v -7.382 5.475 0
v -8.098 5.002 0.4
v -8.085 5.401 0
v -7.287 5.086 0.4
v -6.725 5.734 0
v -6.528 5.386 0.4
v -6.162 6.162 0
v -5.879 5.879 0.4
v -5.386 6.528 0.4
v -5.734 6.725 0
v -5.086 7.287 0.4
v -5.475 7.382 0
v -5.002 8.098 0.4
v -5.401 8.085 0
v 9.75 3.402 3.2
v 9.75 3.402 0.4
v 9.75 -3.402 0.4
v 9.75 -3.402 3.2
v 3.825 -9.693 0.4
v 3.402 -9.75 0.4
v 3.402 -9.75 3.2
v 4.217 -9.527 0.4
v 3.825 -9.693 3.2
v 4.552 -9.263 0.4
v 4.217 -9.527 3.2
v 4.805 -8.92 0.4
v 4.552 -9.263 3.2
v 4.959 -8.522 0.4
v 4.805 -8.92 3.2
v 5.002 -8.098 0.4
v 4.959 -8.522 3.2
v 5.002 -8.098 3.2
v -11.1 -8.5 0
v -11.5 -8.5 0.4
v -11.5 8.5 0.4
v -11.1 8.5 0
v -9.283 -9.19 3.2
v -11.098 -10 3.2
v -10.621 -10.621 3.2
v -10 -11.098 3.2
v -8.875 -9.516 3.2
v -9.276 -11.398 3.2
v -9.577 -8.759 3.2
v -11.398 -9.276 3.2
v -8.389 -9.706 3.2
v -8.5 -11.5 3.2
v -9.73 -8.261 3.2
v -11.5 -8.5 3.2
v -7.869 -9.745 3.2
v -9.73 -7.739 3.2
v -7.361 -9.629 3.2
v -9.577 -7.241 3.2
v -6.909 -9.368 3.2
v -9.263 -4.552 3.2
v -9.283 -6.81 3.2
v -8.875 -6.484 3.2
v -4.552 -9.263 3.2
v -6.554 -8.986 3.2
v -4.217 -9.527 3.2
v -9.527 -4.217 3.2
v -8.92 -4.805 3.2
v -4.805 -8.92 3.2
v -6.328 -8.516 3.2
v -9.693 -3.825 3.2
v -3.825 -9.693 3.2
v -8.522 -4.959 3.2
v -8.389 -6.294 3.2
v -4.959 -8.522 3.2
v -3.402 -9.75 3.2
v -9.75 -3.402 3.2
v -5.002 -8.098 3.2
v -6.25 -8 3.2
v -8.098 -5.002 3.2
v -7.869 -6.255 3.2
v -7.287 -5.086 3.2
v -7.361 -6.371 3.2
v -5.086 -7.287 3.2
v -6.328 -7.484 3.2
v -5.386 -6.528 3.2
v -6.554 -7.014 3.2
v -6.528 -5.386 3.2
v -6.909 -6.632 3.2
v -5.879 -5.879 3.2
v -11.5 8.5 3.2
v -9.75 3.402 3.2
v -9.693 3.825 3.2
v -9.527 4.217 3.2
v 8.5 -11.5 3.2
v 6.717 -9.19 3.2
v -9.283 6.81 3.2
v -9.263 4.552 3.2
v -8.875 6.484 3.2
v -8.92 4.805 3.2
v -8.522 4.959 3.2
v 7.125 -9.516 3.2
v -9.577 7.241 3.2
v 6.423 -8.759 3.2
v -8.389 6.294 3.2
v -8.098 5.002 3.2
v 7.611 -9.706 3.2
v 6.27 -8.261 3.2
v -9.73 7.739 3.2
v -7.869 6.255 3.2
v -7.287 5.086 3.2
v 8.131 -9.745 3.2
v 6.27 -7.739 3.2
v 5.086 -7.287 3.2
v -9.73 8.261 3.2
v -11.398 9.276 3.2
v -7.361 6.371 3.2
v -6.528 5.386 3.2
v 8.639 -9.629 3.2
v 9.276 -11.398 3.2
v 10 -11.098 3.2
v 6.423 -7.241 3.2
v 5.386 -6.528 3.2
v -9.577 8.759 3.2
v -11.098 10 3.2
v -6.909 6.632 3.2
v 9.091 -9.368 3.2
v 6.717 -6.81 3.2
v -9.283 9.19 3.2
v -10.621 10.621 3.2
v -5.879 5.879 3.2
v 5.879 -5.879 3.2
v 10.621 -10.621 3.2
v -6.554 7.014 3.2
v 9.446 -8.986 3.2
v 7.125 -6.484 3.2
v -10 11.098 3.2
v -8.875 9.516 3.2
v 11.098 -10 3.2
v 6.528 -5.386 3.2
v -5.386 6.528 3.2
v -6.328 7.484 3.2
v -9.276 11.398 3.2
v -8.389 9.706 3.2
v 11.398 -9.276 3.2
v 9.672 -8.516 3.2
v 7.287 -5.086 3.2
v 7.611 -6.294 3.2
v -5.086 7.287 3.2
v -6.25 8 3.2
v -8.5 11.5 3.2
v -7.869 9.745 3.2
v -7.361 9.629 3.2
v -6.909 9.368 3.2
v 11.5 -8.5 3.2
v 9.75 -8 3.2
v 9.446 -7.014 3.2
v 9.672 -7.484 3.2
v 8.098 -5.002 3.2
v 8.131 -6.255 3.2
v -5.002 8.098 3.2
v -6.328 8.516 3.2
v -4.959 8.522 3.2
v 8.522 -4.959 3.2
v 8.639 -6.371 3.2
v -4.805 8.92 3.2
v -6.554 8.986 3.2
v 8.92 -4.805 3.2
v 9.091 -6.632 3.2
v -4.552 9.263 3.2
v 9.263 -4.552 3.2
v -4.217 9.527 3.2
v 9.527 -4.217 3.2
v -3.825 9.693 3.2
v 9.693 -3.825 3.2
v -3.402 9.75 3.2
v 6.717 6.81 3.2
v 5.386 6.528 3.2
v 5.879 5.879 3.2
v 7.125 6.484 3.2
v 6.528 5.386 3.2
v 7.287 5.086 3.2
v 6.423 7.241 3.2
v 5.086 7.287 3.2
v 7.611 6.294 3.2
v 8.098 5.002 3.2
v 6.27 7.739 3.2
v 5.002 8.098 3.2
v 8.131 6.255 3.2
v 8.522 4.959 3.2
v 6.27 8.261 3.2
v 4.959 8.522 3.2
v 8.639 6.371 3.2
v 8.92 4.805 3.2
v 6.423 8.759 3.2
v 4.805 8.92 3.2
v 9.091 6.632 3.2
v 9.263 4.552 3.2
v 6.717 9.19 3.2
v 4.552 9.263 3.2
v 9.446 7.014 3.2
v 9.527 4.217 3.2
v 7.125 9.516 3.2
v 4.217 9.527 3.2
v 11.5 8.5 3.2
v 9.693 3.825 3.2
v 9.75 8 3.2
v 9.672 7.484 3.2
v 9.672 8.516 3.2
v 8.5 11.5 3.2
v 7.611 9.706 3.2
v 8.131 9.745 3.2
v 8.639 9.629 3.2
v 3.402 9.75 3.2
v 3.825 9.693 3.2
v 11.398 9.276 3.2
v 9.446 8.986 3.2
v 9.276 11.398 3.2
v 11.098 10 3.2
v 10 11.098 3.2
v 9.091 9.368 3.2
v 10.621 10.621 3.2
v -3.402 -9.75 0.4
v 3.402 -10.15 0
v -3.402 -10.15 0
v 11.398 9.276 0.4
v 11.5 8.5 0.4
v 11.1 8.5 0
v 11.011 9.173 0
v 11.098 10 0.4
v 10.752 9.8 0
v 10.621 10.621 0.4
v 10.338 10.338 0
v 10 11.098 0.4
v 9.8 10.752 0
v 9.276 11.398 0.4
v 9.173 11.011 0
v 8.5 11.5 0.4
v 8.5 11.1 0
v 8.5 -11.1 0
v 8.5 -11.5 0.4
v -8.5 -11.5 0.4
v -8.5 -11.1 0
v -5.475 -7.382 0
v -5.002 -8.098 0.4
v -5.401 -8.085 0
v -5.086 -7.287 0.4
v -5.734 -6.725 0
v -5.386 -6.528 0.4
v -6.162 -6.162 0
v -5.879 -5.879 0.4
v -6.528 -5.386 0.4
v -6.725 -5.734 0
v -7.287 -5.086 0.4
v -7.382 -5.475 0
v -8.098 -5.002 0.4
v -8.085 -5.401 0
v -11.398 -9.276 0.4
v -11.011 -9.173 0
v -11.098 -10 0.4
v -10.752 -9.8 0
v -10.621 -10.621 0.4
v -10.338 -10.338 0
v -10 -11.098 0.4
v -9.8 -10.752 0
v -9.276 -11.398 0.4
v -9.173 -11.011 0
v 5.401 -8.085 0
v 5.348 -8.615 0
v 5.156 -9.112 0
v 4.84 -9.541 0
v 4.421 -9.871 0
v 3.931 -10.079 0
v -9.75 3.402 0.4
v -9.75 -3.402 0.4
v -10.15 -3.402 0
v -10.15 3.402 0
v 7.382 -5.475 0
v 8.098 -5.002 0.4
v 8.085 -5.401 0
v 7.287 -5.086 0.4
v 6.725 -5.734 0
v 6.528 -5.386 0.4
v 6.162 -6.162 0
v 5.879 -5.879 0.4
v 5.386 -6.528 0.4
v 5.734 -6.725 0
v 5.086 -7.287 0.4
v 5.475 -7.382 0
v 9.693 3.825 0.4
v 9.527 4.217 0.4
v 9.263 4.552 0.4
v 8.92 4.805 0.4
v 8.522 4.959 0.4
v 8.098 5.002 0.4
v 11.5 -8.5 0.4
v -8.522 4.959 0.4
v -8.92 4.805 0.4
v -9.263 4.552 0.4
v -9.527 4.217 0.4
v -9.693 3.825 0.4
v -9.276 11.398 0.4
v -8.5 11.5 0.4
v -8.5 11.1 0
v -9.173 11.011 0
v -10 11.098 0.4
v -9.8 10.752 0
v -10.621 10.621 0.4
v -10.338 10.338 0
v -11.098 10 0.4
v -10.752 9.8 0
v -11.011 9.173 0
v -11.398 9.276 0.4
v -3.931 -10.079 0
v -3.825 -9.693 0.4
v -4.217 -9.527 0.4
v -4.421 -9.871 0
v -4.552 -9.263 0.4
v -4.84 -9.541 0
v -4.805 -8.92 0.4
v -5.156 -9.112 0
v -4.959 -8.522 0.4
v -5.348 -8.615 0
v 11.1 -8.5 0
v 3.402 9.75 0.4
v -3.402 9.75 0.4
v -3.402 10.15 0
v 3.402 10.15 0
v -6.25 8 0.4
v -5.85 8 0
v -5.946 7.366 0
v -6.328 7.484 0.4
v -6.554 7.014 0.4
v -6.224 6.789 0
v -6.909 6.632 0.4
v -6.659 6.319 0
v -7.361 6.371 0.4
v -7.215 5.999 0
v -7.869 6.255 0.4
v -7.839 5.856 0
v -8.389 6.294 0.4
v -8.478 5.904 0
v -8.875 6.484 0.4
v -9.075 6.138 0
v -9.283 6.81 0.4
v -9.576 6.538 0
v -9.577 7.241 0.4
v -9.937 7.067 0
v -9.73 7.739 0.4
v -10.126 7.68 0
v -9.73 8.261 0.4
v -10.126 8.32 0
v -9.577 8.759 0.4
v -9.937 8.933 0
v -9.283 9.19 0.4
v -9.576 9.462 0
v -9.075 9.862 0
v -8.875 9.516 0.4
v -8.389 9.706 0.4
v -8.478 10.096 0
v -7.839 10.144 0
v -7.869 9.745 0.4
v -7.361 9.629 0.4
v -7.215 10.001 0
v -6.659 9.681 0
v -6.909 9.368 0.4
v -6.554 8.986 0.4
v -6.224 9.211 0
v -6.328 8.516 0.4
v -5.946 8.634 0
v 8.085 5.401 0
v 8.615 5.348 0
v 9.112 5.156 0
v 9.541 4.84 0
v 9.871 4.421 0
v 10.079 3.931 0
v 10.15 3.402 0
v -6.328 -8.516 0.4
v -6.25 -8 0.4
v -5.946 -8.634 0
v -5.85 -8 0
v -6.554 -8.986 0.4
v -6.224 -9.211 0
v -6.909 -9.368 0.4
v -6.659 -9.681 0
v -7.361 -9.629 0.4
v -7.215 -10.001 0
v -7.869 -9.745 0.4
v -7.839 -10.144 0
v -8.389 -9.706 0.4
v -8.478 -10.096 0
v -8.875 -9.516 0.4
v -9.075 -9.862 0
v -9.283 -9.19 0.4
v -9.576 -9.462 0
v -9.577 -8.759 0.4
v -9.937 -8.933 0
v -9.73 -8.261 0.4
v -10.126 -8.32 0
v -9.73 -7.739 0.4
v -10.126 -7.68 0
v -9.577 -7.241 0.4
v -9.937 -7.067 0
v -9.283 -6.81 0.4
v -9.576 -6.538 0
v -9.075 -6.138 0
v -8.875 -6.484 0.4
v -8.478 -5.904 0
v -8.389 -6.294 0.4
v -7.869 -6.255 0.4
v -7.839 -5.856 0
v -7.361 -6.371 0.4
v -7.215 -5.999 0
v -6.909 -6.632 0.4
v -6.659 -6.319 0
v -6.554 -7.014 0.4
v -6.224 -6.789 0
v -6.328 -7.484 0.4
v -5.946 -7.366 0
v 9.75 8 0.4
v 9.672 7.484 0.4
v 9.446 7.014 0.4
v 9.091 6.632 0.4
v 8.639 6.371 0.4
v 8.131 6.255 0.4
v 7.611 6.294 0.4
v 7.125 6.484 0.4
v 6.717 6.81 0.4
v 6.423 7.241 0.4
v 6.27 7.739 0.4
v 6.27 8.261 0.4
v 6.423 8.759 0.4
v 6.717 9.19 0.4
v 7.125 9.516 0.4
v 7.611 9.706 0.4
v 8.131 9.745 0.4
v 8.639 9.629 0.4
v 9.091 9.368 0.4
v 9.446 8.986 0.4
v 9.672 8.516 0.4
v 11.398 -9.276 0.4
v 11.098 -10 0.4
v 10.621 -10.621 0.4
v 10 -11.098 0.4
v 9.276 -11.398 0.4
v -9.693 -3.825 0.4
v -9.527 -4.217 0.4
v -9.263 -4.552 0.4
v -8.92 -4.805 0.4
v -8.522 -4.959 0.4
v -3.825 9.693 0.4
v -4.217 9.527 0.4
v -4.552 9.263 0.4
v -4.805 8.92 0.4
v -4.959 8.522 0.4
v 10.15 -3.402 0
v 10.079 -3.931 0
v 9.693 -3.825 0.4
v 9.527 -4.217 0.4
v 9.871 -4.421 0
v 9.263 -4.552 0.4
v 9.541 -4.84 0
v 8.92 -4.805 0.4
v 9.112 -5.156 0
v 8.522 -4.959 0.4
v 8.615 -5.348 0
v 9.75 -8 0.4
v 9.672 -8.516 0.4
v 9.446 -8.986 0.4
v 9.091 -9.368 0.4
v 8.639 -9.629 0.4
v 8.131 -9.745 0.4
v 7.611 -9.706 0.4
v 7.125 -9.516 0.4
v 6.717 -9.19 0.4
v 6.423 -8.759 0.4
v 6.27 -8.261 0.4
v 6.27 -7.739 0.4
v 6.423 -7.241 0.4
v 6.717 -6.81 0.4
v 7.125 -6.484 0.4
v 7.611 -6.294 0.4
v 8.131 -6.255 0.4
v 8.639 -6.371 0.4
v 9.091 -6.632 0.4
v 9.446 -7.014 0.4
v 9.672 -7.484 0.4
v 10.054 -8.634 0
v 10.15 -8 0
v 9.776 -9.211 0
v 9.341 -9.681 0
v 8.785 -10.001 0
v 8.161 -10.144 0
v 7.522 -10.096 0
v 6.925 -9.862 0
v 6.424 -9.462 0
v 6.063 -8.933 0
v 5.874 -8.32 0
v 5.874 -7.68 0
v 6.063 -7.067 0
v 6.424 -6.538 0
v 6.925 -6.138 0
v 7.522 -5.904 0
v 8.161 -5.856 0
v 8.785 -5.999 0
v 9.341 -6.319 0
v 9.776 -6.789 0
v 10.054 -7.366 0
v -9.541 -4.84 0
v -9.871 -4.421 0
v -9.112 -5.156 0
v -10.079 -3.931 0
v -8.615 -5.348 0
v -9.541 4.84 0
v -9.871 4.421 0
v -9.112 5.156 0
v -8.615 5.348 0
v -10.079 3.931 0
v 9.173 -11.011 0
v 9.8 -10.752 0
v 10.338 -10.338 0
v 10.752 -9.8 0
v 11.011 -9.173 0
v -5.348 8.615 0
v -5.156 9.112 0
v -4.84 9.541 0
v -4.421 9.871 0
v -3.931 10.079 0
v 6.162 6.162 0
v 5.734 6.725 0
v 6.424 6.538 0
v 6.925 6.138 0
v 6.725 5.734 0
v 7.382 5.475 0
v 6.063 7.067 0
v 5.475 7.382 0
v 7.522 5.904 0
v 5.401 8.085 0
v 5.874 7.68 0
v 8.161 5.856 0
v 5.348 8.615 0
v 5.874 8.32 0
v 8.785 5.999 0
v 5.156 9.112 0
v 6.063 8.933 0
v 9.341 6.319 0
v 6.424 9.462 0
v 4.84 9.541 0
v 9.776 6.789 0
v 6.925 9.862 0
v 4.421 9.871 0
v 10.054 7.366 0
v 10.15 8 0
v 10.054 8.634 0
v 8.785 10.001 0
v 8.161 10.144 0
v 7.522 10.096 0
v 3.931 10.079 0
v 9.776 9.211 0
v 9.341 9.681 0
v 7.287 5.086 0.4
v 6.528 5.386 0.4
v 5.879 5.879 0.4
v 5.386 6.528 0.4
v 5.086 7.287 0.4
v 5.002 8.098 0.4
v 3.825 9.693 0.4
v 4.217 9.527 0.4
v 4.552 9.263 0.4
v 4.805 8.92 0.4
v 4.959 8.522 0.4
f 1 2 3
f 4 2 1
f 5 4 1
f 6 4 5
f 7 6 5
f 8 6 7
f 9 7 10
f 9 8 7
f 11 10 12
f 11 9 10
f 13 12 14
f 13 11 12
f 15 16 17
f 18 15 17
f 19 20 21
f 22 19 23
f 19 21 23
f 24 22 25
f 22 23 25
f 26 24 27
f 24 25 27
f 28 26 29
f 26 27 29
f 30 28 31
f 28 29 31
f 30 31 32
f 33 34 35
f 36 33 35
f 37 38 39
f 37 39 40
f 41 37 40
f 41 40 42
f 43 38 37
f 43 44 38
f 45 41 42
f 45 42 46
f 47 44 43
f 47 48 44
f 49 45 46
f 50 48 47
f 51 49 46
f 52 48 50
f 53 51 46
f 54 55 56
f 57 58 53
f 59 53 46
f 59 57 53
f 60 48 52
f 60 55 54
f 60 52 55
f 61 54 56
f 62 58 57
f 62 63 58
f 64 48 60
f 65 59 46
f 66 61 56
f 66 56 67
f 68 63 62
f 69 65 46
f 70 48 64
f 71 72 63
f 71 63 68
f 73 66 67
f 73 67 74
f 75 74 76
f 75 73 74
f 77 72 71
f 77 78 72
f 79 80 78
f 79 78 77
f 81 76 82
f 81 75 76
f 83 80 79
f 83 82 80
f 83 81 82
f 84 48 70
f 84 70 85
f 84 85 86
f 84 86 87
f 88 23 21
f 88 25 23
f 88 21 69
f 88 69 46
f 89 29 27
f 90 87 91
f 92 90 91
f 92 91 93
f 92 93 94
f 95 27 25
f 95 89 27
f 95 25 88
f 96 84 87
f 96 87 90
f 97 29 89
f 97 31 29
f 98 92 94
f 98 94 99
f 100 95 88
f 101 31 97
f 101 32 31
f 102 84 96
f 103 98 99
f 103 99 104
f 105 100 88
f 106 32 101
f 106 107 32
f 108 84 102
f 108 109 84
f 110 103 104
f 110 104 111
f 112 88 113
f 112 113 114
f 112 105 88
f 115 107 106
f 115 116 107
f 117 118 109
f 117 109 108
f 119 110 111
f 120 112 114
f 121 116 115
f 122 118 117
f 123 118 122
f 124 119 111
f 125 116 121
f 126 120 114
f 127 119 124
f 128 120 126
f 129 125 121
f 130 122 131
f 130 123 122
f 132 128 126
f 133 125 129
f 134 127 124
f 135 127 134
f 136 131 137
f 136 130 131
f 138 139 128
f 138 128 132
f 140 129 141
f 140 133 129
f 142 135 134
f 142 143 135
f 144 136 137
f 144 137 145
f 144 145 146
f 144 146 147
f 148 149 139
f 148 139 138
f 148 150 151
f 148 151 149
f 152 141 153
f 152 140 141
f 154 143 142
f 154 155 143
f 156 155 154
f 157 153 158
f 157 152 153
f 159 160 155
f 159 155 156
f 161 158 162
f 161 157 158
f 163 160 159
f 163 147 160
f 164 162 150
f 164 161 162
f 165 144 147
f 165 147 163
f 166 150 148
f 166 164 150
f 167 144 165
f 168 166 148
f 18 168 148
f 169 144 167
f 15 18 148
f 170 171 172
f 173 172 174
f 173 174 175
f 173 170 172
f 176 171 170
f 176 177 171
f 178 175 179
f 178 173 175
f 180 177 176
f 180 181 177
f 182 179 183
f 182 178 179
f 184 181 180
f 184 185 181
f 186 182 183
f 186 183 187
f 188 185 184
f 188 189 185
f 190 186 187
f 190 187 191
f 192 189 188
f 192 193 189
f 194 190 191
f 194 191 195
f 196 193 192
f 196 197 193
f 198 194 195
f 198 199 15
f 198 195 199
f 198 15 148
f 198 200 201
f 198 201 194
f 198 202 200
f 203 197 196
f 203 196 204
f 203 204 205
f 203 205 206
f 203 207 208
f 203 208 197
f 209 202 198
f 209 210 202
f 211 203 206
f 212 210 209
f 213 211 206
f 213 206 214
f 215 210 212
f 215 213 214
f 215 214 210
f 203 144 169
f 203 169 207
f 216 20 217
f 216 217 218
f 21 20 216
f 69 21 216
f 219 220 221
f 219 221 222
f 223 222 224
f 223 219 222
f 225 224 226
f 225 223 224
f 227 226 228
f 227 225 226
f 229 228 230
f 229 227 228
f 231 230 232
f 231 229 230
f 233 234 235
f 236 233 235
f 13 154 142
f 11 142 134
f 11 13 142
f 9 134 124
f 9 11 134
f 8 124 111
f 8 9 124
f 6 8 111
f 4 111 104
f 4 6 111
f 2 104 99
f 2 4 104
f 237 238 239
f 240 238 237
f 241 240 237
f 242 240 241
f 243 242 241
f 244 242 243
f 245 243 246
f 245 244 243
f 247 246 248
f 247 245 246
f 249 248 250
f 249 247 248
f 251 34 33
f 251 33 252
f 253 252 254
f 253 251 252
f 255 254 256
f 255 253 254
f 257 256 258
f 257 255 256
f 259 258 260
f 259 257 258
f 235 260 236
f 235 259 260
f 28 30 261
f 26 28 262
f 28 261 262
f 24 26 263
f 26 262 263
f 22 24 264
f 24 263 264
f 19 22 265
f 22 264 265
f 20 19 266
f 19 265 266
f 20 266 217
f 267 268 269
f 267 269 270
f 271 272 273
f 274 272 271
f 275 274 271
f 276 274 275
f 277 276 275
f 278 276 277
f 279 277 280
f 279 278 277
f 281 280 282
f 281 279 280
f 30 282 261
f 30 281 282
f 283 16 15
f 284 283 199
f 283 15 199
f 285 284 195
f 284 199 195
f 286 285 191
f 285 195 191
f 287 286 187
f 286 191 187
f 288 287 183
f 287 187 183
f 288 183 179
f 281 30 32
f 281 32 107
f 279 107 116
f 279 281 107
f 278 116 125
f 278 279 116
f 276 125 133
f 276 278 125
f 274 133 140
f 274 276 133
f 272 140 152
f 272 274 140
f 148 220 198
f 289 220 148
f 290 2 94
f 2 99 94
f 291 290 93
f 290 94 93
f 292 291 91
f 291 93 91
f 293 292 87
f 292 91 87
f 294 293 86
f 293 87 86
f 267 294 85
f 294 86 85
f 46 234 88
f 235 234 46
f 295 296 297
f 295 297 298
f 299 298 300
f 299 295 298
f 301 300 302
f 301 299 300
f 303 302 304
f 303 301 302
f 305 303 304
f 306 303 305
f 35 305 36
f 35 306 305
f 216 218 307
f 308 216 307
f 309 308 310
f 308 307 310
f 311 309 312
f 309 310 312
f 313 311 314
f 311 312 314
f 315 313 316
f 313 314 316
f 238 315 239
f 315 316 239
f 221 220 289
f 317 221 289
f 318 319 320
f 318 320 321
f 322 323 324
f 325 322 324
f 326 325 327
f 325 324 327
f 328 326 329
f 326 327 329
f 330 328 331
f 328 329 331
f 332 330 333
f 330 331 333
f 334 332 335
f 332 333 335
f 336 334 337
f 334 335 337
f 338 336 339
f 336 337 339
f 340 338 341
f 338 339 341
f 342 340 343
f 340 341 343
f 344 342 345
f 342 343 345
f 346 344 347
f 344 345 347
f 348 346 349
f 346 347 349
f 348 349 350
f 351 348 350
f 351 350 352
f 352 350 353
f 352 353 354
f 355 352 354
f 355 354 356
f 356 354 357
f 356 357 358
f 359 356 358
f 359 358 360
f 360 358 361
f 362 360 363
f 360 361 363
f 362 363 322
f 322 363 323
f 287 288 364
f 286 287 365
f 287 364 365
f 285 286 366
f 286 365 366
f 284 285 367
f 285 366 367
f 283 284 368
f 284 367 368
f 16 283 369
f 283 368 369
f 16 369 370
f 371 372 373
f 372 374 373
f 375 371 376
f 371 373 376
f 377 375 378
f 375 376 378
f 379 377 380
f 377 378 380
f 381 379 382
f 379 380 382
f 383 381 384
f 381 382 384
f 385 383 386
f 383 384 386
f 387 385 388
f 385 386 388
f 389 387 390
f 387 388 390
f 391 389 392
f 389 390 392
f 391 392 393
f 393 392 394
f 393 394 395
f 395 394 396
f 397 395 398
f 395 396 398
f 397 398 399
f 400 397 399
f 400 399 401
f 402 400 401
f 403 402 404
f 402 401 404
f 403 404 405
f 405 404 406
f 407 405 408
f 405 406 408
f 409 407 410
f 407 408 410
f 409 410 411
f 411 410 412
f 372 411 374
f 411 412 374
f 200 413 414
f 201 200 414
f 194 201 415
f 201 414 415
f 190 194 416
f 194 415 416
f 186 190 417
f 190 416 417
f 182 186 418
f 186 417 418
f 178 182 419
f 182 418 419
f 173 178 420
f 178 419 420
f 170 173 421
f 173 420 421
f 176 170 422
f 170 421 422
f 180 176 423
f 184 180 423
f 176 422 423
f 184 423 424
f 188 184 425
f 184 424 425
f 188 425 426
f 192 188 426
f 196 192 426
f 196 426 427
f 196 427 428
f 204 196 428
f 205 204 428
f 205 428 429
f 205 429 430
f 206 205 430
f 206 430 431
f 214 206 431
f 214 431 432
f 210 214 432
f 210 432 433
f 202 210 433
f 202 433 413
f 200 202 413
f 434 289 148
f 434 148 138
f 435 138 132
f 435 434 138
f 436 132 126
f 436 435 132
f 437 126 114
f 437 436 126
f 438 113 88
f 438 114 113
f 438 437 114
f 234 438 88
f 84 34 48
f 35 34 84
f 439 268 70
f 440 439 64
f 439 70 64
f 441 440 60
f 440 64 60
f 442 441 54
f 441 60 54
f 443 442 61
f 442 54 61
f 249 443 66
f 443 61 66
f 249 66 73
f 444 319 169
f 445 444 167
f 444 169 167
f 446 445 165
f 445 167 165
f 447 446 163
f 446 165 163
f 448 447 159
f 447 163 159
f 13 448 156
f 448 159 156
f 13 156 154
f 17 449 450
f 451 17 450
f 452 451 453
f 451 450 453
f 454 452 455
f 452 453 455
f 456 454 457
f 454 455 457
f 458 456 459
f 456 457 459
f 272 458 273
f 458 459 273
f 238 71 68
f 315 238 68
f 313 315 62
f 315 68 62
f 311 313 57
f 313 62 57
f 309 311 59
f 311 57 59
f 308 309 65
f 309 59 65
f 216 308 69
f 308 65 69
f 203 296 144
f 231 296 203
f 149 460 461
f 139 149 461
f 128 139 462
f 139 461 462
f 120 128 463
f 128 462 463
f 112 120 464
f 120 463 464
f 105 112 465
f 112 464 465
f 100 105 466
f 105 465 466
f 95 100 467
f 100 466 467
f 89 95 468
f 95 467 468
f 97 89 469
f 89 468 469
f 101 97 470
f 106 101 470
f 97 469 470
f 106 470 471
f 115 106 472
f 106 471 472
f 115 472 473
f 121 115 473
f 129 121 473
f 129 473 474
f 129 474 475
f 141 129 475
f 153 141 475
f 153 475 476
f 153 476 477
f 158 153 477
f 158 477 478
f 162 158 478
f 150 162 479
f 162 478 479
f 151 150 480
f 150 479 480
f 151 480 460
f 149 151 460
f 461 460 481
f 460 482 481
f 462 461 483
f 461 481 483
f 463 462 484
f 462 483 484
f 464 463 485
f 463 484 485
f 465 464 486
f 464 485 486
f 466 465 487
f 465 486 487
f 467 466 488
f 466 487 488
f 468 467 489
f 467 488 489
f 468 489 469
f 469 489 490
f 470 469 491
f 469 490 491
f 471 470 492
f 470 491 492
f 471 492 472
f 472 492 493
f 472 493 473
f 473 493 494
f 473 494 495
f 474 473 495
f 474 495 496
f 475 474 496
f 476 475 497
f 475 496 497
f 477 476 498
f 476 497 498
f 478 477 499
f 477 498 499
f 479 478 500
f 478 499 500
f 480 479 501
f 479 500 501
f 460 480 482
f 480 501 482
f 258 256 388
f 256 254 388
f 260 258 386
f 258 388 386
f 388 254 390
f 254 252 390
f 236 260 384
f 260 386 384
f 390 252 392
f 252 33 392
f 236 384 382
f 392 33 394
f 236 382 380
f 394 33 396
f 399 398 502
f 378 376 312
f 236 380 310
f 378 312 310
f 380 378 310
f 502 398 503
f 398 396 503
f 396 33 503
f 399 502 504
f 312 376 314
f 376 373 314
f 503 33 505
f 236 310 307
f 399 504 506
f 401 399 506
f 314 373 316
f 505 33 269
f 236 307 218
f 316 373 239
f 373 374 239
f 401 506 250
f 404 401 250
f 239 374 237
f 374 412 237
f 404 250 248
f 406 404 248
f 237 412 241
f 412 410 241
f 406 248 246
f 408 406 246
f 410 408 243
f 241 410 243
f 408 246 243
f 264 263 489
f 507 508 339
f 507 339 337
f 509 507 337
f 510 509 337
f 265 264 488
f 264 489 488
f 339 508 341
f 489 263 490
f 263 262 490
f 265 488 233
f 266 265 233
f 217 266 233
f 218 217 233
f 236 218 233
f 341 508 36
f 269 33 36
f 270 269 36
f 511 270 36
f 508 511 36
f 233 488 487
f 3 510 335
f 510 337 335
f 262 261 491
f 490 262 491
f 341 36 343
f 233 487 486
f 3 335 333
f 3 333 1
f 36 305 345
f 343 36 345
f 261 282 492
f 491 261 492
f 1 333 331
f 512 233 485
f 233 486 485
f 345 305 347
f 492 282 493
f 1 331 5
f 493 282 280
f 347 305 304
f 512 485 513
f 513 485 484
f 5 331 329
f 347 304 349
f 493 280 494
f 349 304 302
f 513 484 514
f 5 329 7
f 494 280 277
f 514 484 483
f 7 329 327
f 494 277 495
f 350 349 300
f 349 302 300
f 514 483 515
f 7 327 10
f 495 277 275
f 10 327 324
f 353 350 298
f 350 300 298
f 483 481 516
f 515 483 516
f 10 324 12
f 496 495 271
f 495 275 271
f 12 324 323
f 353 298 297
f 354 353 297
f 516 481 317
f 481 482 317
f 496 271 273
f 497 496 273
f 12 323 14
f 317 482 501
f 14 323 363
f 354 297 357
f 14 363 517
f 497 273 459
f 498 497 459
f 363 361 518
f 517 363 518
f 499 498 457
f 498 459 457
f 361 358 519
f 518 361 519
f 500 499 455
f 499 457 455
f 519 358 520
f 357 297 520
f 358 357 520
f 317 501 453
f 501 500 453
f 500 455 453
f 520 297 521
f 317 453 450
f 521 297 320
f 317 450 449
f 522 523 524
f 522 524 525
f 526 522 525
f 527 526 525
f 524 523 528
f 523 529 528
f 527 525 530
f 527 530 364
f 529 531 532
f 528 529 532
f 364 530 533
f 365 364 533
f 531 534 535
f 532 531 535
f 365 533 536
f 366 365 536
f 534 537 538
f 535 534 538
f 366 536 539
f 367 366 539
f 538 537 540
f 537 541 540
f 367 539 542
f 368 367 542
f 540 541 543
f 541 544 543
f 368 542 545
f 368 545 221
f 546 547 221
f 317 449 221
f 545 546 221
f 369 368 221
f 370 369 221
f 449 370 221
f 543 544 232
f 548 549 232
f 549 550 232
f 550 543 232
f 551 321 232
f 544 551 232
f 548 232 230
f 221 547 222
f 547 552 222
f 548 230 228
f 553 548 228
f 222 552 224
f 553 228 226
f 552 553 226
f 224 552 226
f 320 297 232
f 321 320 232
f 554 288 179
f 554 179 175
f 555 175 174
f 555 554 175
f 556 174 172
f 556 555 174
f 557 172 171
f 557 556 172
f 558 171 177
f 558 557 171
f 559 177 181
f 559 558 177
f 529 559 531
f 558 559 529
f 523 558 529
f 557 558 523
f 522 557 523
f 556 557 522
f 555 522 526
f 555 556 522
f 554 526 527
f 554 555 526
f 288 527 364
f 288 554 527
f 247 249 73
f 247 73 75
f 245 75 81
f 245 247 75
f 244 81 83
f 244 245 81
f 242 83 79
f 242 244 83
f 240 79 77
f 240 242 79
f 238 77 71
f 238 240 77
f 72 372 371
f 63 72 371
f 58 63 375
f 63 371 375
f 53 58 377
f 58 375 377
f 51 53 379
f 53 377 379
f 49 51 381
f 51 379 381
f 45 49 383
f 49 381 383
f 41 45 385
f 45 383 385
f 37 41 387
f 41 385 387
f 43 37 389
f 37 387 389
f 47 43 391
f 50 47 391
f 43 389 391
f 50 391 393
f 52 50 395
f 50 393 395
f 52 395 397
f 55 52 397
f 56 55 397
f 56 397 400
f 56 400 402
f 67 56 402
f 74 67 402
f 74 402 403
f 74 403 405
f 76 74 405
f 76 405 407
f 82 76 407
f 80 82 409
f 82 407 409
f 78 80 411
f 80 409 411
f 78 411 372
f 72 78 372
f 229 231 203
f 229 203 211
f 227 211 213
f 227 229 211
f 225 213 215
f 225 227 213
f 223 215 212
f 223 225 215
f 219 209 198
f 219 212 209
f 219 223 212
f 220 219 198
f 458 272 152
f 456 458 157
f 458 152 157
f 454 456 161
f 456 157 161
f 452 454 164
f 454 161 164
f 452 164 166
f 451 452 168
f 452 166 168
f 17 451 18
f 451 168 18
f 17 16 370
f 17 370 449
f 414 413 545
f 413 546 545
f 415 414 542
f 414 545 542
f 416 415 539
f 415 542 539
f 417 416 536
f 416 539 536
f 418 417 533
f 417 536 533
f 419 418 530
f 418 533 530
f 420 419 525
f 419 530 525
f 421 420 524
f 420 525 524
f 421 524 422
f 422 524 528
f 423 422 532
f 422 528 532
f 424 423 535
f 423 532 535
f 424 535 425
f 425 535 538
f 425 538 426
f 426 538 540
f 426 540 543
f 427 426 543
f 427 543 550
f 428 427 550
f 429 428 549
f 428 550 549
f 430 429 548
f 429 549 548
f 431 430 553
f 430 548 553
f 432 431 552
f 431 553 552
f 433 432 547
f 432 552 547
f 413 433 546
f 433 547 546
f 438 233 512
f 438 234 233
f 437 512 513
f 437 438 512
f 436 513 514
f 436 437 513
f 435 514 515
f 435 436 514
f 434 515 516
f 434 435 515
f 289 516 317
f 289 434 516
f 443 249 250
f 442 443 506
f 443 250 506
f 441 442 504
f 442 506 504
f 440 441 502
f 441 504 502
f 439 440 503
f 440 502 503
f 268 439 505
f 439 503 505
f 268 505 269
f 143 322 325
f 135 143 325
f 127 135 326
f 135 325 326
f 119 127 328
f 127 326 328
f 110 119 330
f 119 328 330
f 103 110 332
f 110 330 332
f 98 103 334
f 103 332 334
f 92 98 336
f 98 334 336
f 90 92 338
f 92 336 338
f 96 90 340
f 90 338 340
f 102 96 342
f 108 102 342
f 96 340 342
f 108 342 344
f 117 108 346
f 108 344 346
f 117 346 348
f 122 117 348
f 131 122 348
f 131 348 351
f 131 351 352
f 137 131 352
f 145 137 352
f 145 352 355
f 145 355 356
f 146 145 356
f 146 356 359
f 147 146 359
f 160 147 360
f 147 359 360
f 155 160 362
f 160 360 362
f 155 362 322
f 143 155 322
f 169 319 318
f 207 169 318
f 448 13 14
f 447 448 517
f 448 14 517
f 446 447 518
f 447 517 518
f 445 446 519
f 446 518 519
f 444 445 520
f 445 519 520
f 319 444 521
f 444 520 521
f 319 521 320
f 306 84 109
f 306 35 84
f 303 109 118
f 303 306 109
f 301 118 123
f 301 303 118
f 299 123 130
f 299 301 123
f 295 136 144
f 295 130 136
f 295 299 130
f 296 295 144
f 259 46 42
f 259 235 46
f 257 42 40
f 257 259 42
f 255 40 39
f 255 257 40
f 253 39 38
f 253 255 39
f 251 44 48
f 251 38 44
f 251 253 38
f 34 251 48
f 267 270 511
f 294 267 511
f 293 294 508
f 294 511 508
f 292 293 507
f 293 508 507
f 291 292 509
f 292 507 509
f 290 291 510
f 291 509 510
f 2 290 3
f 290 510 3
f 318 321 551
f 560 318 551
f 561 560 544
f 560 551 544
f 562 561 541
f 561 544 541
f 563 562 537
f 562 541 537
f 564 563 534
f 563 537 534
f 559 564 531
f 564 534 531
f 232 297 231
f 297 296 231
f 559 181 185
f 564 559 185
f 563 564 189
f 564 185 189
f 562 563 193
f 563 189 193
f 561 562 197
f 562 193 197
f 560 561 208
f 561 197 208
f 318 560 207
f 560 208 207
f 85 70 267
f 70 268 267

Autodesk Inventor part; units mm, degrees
ref_plane "YZ Plane" through (0, 0, 0) normal (1, 0, 0) x (0, 1, 0)
ref_plane "XZ Plane" through (0, 0, 0) normal (0, 1, 0) x (-1, 0, 0)
ref_plane "XY Plane" through (0, 0, 0) normal (0, 0, 1) x (1, 0, 0)
sketch "Эскиз1" plane through (0, 0, 0) normal (0, 0, 1) x (1, 0, 0)
  line L0 (8.5, -11.5) -> (-8.5, -11.5)
  line L1 (-11.5, -8.5) -> (-11.5, 8.5)
  line L2 (-8.5, 11.5) -> (8.5, 11.5)
  line L3 (11.5, 8.5) -> (11.5, -8.5)
  line L4 (11.5, -11.5) -> (-11.5, 11.5) construction
  line L5 (-11.5, -11.5) -> (11.5, 11.5) construction
  line L6 (8, -8) -> (-8, -8) construction
  line L7 (-8, -8) -> (-8, 8) construction
  line L8 (-8, 8) -> (8, 8) construction
  line L9 (8, 8) -> (8, -8) construction
  line L10 (8, -8) -> (-8, 8) construction
  line L11 (-8, -8) -> (8, 8) construction
  circle A0 centre (-8, 8) radius 1.75
  circle A1 centre (8, 8) radius 1.75
  circle A2 centre (-8, -8) radius 1.75
  circle A3 centre (8, -8) radius 1.75
  arc A4 (-8.5, 11.5) -> (-11.5, 8.5) centre (-8.5, 8.5) ccw
  arc A5 (11.5, 8.5) -> (8.5, 11.5) centre (8.5, 8.5) ccw
  arc A6 (-11.5, -8.5) -> (-8.5, -11.5) centre (-8.5, -8.5) ccw
  arc A7 (8.5, -11.5) -> (11.5, -8.5) centre (8.5, -8.5) ccw
  line L12 (-9.75, 9.75) -> (9.75, 9.75)
  line L13 (9.75, 9.75) -> (9.75, -9.75)
  line L14 (9.75, -9.75) -> (-9.75, -9.75)
  line L15 (-9.75, -9.75) -> (-9.75, 9.75)
  circle A8 centre (-8, 8) radius 3
  circle A9 centre (8, 8) radius 3
  circle A10 centre (8, -8) radius 3
  circle A11 centre (-8, -8) radius 3
  point P0 (0, 0)
  point P1 (0, 0)
  point P2 (-5.5633, 9.75)
  point P3 (5.5633, 9.75)
  point P4 (9.75, 5.5633)
  point P5 (9.75, -5.5633)
  point P6 (5.5633, -9.75)
  point P7 (-5.5633, -9.75)
  point P8 (-9.75, -5.5633)
  point P9 (-9.75, 5.5633)
  dimension "d0" = 23
  dimension "d2" = 16
  dimension "d4" = 3.5
  dimension "d5" = 3
  dimension "d8" = 6
extrude "Выдавливание1" add sketch "Эскиз1" along normal blind 3.2 contours L0 A6 L1 A4 L2 A5 L3 A7 | A0 L12 A8 L15 | A0 L15 L12 | L12 L15 A8 | A9 L13 L12 | L12 A1 L13 A9 | A11 L14 A2 L15 | L15 L14 A11 | L12 L13 A1 | A2 L14 L15 | A10 L14 L13 | L13 A3 L14 A10 | L13 L14 A3
fillet "Сопряжение1" radius 1.6 8 edges at (5.5633, 9.75, 1.6) (-5.5633, 9.75, 1.6) (-9.75, 5.5633, 1.6) (-9.75, -5.5633, 1.6) (-5.5633, -9.75, 1.6) (5.5633, -9.75, 1.6) (9.75, -5.5633, 1.6) (9.75, 5.5633, 1.6)
chamfer "Фаска1" distance 0.4 angle 45 20 edges at (-9.75, -8, 0) (6.25, -8, 0) (6.25, 8, 0) (-9.75, 8, 0) (0, 9.75, 0) (5.8787, 5.8787, 0) (9.75, 0, 0) (5.8787, -5.8787, 0) (0, -9.75, 0) (-5.8787, -5.8787, 0) (-9.75, 0, 0) (-5.8787, 5.8787, 0) (0, 11.5, 0) (-10.6213, 10.6213, 0) (-11.5, 0, 0) (-10.6213, -10.6213, 0) (0, -11.5, 0) (10.6213, -10.6213, 0) (11.5, 0, 0) (10.6213, 10.6213, 0)
properties part number "Проставка датчика"
